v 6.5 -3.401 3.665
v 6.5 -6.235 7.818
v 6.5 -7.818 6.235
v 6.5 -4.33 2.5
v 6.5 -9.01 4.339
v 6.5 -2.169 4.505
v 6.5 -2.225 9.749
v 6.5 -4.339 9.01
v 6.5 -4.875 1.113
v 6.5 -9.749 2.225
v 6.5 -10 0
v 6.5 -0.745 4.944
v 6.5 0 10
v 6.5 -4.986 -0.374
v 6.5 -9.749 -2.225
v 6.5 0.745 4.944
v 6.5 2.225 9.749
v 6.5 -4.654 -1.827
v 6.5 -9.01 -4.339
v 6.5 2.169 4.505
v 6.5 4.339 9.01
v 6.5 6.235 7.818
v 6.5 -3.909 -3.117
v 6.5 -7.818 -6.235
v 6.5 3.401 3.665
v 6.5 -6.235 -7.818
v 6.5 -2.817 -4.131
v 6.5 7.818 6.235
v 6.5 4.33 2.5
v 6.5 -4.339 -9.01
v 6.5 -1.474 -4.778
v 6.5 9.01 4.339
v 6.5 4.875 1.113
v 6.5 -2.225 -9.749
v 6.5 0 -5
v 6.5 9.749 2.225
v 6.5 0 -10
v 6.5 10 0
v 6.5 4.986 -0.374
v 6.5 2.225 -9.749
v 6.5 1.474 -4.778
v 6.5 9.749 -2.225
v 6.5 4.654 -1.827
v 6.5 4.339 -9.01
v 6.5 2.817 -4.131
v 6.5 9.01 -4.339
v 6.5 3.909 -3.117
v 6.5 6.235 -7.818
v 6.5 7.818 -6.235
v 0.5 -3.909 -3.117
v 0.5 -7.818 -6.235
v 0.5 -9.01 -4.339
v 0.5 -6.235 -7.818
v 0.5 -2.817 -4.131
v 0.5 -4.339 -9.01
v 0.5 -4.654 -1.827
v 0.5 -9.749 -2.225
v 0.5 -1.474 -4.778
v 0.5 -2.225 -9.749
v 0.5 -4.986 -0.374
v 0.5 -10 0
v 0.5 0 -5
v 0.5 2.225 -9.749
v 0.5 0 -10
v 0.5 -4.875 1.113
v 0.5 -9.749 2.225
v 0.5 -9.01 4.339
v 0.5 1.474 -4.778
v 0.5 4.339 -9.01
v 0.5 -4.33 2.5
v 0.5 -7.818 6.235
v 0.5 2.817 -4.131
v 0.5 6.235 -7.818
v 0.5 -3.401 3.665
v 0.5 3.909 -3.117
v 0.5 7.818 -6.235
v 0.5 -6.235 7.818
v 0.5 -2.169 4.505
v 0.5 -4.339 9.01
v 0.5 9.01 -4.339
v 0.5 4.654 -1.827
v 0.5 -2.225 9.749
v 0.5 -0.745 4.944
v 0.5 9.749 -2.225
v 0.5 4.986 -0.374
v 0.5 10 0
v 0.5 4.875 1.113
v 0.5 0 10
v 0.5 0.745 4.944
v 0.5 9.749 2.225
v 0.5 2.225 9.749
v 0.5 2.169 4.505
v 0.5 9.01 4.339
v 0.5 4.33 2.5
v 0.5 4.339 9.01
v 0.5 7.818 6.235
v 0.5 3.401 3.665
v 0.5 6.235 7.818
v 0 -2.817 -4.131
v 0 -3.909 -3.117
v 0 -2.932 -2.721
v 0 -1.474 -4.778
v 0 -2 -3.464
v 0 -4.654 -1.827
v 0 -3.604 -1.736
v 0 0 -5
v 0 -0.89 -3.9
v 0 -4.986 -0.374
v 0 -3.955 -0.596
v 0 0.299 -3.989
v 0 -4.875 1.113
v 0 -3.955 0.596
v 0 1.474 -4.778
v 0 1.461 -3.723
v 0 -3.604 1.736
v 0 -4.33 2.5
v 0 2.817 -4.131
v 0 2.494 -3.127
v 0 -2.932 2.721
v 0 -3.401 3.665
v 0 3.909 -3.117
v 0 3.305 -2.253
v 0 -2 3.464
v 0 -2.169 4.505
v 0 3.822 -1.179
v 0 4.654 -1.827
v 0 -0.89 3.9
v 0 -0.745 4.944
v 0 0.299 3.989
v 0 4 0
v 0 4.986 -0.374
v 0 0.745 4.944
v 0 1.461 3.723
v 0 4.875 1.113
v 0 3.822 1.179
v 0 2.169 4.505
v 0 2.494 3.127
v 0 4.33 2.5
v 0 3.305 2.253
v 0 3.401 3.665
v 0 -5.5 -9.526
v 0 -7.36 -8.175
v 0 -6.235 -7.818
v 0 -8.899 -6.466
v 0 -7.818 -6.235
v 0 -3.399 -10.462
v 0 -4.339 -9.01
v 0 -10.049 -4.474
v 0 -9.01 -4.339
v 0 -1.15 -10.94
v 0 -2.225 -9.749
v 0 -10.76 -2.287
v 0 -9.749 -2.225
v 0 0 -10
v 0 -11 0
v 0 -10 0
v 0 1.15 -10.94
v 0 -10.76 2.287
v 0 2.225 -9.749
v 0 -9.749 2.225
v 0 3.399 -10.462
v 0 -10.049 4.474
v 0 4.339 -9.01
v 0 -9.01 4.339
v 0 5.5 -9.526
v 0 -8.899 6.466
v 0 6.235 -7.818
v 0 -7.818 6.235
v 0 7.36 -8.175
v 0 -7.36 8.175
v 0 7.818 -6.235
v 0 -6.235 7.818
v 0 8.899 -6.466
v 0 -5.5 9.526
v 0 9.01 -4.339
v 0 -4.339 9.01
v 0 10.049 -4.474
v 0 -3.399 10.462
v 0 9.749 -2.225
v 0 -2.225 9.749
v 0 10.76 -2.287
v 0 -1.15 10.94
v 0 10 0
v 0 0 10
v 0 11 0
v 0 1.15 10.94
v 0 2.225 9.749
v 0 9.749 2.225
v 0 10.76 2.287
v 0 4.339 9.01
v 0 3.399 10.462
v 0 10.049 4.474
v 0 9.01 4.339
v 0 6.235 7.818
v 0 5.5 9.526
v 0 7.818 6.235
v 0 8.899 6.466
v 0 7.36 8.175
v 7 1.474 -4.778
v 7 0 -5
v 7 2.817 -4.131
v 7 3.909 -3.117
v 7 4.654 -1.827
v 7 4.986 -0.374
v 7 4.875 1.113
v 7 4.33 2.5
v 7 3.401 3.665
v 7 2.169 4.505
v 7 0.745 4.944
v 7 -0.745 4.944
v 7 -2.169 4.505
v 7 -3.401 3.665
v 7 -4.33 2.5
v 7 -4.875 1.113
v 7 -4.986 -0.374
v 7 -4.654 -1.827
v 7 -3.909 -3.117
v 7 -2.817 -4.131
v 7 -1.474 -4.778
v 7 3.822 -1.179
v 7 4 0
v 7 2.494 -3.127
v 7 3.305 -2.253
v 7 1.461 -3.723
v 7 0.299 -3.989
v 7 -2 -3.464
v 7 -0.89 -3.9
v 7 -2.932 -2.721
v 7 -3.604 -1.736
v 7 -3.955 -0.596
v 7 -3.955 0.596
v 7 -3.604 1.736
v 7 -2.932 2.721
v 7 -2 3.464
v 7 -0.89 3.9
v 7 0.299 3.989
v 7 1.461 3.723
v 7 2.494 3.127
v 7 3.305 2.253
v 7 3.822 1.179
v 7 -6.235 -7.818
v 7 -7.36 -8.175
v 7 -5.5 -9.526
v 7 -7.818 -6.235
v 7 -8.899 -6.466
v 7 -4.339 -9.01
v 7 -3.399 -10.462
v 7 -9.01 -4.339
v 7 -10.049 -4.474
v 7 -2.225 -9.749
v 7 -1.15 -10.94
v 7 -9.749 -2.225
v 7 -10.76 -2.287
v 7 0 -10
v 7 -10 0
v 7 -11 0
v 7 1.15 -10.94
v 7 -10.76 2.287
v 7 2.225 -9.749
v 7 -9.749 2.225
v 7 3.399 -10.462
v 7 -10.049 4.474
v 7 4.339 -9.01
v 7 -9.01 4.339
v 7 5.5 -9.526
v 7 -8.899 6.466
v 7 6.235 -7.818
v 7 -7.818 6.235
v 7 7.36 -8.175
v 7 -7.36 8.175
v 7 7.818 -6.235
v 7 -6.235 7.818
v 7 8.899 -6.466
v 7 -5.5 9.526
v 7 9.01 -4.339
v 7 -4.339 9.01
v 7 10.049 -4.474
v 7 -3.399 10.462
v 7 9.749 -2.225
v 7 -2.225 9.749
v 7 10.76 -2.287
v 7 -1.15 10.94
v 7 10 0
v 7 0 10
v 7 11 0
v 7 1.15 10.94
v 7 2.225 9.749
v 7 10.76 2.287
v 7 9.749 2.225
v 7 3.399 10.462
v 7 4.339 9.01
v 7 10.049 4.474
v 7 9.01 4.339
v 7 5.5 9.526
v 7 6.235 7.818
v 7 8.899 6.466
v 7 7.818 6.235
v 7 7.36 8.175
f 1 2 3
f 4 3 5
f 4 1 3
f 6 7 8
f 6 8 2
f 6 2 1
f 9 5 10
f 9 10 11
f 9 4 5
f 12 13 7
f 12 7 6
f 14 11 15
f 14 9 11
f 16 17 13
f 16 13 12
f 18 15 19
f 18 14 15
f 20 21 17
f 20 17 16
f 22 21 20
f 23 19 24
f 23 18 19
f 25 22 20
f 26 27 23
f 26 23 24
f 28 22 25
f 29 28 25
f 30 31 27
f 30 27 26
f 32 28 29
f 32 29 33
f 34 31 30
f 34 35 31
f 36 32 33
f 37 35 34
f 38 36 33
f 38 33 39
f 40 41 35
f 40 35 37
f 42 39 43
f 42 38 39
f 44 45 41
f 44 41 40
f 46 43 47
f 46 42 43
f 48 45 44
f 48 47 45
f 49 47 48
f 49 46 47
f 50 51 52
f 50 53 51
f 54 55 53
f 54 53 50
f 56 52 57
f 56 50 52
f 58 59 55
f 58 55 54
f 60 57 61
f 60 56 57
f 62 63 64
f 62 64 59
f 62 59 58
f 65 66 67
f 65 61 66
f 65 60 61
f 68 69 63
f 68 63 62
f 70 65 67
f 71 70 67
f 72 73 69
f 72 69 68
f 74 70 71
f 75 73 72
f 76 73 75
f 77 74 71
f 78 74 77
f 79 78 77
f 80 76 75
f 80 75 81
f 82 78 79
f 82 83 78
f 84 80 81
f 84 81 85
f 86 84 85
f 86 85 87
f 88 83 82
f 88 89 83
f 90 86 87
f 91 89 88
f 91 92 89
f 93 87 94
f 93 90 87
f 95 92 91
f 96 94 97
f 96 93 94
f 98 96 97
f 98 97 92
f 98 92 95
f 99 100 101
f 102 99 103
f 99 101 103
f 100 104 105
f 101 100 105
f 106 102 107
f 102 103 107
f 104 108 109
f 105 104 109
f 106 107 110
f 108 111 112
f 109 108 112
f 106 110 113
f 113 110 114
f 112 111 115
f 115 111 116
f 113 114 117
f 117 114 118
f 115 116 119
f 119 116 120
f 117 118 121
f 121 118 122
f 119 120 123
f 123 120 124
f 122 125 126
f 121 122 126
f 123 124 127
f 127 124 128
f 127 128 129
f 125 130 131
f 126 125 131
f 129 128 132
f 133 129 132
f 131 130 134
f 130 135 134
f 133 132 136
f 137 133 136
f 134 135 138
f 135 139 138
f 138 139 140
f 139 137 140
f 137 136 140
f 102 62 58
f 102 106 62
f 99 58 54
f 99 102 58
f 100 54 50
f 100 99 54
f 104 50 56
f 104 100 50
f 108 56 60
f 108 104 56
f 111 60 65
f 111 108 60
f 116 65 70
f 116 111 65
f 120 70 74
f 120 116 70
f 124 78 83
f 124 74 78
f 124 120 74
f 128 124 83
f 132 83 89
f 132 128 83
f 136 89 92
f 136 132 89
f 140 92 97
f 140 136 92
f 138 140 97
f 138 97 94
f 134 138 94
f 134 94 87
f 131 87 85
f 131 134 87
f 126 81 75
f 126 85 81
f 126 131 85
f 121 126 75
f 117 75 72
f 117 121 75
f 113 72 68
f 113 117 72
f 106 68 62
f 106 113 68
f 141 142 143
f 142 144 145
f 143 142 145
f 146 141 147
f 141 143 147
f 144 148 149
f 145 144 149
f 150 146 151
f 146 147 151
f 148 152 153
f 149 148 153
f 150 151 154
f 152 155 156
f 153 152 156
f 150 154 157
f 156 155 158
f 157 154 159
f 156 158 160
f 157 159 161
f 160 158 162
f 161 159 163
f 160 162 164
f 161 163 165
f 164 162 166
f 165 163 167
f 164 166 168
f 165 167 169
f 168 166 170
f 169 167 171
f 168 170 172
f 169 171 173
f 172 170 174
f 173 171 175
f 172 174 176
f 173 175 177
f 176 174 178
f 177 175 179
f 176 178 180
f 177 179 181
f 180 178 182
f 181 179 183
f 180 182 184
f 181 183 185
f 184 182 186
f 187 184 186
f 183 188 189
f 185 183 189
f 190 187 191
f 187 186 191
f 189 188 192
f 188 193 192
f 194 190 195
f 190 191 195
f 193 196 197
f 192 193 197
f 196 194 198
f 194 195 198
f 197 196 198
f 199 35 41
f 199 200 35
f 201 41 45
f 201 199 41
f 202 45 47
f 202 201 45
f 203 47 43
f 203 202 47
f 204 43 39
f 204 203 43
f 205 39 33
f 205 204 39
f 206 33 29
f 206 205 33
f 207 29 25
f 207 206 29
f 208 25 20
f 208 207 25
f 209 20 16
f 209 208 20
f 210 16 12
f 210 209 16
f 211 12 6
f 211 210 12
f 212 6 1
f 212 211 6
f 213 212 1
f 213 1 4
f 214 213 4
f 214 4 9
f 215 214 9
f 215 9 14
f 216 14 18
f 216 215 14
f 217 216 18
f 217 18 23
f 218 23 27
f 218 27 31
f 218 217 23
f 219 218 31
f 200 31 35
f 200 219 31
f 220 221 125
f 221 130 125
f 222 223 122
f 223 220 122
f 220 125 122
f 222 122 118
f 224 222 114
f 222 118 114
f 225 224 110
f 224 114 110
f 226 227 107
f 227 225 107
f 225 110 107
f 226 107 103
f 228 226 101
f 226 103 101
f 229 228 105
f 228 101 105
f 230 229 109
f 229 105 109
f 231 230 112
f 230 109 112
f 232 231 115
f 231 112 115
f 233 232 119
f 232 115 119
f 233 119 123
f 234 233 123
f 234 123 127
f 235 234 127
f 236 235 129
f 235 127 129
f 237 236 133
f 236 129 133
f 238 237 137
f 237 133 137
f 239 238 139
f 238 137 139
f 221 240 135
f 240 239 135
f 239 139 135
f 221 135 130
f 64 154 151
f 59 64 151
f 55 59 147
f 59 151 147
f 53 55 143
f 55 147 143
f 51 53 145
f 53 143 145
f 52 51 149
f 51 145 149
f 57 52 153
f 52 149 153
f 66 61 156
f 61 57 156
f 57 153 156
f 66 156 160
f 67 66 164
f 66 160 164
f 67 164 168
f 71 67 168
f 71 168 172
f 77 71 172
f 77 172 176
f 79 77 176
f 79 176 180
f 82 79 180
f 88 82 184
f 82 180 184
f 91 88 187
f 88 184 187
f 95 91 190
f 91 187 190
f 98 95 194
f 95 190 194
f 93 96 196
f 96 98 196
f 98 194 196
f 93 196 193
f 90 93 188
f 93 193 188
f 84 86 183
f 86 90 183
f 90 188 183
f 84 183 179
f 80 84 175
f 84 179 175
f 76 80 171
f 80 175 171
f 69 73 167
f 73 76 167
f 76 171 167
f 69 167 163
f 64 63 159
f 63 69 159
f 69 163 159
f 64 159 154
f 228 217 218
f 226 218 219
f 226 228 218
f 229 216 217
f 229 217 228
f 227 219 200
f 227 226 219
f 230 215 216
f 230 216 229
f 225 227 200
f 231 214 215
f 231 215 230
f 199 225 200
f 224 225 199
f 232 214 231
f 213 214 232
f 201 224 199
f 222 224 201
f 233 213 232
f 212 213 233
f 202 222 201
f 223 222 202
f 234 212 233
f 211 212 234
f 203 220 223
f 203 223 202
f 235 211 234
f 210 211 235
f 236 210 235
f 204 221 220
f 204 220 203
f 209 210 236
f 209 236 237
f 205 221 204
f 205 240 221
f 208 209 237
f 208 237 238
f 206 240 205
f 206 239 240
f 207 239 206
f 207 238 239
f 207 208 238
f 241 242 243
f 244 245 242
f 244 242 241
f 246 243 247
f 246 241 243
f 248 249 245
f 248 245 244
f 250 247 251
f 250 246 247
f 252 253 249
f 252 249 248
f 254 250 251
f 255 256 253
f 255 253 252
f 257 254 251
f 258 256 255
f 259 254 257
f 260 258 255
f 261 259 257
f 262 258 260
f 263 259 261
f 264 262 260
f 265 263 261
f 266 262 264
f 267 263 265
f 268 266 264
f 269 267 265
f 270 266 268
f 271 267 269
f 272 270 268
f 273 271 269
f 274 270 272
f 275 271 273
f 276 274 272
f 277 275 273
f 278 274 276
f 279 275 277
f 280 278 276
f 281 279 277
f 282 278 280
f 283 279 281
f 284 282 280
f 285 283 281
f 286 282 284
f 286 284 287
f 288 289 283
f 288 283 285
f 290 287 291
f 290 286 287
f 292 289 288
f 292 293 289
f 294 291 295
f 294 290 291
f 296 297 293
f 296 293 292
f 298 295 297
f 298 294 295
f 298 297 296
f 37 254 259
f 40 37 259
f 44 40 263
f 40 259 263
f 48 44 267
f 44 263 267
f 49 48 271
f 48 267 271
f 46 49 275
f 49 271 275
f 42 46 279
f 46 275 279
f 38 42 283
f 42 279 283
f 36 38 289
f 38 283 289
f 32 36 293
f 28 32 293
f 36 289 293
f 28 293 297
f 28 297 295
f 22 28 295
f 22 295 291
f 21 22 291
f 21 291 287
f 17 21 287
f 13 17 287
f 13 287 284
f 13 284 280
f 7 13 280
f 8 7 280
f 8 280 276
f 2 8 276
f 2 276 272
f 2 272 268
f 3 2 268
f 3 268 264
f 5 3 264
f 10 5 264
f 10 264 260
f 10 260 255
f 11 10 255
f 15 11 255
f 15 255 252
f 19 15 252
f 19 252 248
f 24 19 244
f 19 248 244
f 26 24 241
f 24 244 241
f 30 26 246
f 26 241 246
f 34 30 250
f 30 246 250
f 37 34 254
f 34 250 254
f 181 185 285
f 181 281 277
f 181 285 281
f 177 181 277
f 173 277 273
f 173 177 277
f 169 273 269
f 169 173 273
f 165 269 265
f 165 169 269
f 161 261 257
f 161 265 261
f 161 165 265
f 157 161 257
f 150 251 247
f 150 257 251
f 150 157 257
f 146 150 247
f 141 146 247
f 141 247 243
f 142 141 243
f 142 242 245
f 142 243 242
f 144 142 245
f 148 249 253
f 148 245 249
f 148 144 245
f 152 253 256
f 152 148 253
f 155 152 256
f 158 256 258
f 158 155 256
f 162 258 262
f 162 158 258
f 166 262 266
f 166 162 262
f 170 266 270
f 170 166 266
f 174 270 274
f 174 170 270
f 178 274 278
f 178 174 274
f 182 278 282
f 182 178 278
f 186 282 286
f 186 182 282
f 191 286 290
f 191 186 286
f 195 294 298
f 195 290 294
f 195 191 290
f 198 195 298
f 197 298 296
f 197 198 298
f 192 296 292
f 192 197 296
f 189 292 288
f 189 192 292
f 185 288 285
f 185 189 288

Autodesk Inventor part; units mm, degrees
ref_plane "YZ Plane" through (0, 0, 0) normal (1, 0, 0) x (0, 1, 0)
ref_plane "XZ Plane" through (0, 0, 0) normal (0, 1, 0) x (-1, 0, 0)
sketch "Sketch1" plane through (0, 0, 0) normal (1, 0, 0) x (0, 1, 0)
  circle A0 centre (0, 0) radius 4
  circle A1 centre (0, 0) radius 11
  dimension "d0" = 8
  dimension "d1" = 22
extrude "Extrusion1" add sketch "Sketch1" along normal blind 7
ref_plane "Work Plane1" through (3.5, 0, 0) normal (-1, 0, 0) x (0, 0, 1)
sketch "Sketch2" plane through (7, 0, 0) normal (1, 0, 0) x (0, 0, -1)
  circle A0 centre (0, 0) radius 4 projected
  circle A1 centre (0, 0) radius 11 projected
  circle A2 centre (0, 0) radius 5
  circle A3 centre (0, 0) radius 10
  dimension "d4" = 1
  dimension "d5" = 1
extrude "Extrusion2" cut sketch "Sketch2" against normal blind 0.5 contours A3
mirror "Mirror1" about plane through (3.5, 0, 0) normal (-1, 0, 0) of "Extrusion2"
properties part number "608bearing"
